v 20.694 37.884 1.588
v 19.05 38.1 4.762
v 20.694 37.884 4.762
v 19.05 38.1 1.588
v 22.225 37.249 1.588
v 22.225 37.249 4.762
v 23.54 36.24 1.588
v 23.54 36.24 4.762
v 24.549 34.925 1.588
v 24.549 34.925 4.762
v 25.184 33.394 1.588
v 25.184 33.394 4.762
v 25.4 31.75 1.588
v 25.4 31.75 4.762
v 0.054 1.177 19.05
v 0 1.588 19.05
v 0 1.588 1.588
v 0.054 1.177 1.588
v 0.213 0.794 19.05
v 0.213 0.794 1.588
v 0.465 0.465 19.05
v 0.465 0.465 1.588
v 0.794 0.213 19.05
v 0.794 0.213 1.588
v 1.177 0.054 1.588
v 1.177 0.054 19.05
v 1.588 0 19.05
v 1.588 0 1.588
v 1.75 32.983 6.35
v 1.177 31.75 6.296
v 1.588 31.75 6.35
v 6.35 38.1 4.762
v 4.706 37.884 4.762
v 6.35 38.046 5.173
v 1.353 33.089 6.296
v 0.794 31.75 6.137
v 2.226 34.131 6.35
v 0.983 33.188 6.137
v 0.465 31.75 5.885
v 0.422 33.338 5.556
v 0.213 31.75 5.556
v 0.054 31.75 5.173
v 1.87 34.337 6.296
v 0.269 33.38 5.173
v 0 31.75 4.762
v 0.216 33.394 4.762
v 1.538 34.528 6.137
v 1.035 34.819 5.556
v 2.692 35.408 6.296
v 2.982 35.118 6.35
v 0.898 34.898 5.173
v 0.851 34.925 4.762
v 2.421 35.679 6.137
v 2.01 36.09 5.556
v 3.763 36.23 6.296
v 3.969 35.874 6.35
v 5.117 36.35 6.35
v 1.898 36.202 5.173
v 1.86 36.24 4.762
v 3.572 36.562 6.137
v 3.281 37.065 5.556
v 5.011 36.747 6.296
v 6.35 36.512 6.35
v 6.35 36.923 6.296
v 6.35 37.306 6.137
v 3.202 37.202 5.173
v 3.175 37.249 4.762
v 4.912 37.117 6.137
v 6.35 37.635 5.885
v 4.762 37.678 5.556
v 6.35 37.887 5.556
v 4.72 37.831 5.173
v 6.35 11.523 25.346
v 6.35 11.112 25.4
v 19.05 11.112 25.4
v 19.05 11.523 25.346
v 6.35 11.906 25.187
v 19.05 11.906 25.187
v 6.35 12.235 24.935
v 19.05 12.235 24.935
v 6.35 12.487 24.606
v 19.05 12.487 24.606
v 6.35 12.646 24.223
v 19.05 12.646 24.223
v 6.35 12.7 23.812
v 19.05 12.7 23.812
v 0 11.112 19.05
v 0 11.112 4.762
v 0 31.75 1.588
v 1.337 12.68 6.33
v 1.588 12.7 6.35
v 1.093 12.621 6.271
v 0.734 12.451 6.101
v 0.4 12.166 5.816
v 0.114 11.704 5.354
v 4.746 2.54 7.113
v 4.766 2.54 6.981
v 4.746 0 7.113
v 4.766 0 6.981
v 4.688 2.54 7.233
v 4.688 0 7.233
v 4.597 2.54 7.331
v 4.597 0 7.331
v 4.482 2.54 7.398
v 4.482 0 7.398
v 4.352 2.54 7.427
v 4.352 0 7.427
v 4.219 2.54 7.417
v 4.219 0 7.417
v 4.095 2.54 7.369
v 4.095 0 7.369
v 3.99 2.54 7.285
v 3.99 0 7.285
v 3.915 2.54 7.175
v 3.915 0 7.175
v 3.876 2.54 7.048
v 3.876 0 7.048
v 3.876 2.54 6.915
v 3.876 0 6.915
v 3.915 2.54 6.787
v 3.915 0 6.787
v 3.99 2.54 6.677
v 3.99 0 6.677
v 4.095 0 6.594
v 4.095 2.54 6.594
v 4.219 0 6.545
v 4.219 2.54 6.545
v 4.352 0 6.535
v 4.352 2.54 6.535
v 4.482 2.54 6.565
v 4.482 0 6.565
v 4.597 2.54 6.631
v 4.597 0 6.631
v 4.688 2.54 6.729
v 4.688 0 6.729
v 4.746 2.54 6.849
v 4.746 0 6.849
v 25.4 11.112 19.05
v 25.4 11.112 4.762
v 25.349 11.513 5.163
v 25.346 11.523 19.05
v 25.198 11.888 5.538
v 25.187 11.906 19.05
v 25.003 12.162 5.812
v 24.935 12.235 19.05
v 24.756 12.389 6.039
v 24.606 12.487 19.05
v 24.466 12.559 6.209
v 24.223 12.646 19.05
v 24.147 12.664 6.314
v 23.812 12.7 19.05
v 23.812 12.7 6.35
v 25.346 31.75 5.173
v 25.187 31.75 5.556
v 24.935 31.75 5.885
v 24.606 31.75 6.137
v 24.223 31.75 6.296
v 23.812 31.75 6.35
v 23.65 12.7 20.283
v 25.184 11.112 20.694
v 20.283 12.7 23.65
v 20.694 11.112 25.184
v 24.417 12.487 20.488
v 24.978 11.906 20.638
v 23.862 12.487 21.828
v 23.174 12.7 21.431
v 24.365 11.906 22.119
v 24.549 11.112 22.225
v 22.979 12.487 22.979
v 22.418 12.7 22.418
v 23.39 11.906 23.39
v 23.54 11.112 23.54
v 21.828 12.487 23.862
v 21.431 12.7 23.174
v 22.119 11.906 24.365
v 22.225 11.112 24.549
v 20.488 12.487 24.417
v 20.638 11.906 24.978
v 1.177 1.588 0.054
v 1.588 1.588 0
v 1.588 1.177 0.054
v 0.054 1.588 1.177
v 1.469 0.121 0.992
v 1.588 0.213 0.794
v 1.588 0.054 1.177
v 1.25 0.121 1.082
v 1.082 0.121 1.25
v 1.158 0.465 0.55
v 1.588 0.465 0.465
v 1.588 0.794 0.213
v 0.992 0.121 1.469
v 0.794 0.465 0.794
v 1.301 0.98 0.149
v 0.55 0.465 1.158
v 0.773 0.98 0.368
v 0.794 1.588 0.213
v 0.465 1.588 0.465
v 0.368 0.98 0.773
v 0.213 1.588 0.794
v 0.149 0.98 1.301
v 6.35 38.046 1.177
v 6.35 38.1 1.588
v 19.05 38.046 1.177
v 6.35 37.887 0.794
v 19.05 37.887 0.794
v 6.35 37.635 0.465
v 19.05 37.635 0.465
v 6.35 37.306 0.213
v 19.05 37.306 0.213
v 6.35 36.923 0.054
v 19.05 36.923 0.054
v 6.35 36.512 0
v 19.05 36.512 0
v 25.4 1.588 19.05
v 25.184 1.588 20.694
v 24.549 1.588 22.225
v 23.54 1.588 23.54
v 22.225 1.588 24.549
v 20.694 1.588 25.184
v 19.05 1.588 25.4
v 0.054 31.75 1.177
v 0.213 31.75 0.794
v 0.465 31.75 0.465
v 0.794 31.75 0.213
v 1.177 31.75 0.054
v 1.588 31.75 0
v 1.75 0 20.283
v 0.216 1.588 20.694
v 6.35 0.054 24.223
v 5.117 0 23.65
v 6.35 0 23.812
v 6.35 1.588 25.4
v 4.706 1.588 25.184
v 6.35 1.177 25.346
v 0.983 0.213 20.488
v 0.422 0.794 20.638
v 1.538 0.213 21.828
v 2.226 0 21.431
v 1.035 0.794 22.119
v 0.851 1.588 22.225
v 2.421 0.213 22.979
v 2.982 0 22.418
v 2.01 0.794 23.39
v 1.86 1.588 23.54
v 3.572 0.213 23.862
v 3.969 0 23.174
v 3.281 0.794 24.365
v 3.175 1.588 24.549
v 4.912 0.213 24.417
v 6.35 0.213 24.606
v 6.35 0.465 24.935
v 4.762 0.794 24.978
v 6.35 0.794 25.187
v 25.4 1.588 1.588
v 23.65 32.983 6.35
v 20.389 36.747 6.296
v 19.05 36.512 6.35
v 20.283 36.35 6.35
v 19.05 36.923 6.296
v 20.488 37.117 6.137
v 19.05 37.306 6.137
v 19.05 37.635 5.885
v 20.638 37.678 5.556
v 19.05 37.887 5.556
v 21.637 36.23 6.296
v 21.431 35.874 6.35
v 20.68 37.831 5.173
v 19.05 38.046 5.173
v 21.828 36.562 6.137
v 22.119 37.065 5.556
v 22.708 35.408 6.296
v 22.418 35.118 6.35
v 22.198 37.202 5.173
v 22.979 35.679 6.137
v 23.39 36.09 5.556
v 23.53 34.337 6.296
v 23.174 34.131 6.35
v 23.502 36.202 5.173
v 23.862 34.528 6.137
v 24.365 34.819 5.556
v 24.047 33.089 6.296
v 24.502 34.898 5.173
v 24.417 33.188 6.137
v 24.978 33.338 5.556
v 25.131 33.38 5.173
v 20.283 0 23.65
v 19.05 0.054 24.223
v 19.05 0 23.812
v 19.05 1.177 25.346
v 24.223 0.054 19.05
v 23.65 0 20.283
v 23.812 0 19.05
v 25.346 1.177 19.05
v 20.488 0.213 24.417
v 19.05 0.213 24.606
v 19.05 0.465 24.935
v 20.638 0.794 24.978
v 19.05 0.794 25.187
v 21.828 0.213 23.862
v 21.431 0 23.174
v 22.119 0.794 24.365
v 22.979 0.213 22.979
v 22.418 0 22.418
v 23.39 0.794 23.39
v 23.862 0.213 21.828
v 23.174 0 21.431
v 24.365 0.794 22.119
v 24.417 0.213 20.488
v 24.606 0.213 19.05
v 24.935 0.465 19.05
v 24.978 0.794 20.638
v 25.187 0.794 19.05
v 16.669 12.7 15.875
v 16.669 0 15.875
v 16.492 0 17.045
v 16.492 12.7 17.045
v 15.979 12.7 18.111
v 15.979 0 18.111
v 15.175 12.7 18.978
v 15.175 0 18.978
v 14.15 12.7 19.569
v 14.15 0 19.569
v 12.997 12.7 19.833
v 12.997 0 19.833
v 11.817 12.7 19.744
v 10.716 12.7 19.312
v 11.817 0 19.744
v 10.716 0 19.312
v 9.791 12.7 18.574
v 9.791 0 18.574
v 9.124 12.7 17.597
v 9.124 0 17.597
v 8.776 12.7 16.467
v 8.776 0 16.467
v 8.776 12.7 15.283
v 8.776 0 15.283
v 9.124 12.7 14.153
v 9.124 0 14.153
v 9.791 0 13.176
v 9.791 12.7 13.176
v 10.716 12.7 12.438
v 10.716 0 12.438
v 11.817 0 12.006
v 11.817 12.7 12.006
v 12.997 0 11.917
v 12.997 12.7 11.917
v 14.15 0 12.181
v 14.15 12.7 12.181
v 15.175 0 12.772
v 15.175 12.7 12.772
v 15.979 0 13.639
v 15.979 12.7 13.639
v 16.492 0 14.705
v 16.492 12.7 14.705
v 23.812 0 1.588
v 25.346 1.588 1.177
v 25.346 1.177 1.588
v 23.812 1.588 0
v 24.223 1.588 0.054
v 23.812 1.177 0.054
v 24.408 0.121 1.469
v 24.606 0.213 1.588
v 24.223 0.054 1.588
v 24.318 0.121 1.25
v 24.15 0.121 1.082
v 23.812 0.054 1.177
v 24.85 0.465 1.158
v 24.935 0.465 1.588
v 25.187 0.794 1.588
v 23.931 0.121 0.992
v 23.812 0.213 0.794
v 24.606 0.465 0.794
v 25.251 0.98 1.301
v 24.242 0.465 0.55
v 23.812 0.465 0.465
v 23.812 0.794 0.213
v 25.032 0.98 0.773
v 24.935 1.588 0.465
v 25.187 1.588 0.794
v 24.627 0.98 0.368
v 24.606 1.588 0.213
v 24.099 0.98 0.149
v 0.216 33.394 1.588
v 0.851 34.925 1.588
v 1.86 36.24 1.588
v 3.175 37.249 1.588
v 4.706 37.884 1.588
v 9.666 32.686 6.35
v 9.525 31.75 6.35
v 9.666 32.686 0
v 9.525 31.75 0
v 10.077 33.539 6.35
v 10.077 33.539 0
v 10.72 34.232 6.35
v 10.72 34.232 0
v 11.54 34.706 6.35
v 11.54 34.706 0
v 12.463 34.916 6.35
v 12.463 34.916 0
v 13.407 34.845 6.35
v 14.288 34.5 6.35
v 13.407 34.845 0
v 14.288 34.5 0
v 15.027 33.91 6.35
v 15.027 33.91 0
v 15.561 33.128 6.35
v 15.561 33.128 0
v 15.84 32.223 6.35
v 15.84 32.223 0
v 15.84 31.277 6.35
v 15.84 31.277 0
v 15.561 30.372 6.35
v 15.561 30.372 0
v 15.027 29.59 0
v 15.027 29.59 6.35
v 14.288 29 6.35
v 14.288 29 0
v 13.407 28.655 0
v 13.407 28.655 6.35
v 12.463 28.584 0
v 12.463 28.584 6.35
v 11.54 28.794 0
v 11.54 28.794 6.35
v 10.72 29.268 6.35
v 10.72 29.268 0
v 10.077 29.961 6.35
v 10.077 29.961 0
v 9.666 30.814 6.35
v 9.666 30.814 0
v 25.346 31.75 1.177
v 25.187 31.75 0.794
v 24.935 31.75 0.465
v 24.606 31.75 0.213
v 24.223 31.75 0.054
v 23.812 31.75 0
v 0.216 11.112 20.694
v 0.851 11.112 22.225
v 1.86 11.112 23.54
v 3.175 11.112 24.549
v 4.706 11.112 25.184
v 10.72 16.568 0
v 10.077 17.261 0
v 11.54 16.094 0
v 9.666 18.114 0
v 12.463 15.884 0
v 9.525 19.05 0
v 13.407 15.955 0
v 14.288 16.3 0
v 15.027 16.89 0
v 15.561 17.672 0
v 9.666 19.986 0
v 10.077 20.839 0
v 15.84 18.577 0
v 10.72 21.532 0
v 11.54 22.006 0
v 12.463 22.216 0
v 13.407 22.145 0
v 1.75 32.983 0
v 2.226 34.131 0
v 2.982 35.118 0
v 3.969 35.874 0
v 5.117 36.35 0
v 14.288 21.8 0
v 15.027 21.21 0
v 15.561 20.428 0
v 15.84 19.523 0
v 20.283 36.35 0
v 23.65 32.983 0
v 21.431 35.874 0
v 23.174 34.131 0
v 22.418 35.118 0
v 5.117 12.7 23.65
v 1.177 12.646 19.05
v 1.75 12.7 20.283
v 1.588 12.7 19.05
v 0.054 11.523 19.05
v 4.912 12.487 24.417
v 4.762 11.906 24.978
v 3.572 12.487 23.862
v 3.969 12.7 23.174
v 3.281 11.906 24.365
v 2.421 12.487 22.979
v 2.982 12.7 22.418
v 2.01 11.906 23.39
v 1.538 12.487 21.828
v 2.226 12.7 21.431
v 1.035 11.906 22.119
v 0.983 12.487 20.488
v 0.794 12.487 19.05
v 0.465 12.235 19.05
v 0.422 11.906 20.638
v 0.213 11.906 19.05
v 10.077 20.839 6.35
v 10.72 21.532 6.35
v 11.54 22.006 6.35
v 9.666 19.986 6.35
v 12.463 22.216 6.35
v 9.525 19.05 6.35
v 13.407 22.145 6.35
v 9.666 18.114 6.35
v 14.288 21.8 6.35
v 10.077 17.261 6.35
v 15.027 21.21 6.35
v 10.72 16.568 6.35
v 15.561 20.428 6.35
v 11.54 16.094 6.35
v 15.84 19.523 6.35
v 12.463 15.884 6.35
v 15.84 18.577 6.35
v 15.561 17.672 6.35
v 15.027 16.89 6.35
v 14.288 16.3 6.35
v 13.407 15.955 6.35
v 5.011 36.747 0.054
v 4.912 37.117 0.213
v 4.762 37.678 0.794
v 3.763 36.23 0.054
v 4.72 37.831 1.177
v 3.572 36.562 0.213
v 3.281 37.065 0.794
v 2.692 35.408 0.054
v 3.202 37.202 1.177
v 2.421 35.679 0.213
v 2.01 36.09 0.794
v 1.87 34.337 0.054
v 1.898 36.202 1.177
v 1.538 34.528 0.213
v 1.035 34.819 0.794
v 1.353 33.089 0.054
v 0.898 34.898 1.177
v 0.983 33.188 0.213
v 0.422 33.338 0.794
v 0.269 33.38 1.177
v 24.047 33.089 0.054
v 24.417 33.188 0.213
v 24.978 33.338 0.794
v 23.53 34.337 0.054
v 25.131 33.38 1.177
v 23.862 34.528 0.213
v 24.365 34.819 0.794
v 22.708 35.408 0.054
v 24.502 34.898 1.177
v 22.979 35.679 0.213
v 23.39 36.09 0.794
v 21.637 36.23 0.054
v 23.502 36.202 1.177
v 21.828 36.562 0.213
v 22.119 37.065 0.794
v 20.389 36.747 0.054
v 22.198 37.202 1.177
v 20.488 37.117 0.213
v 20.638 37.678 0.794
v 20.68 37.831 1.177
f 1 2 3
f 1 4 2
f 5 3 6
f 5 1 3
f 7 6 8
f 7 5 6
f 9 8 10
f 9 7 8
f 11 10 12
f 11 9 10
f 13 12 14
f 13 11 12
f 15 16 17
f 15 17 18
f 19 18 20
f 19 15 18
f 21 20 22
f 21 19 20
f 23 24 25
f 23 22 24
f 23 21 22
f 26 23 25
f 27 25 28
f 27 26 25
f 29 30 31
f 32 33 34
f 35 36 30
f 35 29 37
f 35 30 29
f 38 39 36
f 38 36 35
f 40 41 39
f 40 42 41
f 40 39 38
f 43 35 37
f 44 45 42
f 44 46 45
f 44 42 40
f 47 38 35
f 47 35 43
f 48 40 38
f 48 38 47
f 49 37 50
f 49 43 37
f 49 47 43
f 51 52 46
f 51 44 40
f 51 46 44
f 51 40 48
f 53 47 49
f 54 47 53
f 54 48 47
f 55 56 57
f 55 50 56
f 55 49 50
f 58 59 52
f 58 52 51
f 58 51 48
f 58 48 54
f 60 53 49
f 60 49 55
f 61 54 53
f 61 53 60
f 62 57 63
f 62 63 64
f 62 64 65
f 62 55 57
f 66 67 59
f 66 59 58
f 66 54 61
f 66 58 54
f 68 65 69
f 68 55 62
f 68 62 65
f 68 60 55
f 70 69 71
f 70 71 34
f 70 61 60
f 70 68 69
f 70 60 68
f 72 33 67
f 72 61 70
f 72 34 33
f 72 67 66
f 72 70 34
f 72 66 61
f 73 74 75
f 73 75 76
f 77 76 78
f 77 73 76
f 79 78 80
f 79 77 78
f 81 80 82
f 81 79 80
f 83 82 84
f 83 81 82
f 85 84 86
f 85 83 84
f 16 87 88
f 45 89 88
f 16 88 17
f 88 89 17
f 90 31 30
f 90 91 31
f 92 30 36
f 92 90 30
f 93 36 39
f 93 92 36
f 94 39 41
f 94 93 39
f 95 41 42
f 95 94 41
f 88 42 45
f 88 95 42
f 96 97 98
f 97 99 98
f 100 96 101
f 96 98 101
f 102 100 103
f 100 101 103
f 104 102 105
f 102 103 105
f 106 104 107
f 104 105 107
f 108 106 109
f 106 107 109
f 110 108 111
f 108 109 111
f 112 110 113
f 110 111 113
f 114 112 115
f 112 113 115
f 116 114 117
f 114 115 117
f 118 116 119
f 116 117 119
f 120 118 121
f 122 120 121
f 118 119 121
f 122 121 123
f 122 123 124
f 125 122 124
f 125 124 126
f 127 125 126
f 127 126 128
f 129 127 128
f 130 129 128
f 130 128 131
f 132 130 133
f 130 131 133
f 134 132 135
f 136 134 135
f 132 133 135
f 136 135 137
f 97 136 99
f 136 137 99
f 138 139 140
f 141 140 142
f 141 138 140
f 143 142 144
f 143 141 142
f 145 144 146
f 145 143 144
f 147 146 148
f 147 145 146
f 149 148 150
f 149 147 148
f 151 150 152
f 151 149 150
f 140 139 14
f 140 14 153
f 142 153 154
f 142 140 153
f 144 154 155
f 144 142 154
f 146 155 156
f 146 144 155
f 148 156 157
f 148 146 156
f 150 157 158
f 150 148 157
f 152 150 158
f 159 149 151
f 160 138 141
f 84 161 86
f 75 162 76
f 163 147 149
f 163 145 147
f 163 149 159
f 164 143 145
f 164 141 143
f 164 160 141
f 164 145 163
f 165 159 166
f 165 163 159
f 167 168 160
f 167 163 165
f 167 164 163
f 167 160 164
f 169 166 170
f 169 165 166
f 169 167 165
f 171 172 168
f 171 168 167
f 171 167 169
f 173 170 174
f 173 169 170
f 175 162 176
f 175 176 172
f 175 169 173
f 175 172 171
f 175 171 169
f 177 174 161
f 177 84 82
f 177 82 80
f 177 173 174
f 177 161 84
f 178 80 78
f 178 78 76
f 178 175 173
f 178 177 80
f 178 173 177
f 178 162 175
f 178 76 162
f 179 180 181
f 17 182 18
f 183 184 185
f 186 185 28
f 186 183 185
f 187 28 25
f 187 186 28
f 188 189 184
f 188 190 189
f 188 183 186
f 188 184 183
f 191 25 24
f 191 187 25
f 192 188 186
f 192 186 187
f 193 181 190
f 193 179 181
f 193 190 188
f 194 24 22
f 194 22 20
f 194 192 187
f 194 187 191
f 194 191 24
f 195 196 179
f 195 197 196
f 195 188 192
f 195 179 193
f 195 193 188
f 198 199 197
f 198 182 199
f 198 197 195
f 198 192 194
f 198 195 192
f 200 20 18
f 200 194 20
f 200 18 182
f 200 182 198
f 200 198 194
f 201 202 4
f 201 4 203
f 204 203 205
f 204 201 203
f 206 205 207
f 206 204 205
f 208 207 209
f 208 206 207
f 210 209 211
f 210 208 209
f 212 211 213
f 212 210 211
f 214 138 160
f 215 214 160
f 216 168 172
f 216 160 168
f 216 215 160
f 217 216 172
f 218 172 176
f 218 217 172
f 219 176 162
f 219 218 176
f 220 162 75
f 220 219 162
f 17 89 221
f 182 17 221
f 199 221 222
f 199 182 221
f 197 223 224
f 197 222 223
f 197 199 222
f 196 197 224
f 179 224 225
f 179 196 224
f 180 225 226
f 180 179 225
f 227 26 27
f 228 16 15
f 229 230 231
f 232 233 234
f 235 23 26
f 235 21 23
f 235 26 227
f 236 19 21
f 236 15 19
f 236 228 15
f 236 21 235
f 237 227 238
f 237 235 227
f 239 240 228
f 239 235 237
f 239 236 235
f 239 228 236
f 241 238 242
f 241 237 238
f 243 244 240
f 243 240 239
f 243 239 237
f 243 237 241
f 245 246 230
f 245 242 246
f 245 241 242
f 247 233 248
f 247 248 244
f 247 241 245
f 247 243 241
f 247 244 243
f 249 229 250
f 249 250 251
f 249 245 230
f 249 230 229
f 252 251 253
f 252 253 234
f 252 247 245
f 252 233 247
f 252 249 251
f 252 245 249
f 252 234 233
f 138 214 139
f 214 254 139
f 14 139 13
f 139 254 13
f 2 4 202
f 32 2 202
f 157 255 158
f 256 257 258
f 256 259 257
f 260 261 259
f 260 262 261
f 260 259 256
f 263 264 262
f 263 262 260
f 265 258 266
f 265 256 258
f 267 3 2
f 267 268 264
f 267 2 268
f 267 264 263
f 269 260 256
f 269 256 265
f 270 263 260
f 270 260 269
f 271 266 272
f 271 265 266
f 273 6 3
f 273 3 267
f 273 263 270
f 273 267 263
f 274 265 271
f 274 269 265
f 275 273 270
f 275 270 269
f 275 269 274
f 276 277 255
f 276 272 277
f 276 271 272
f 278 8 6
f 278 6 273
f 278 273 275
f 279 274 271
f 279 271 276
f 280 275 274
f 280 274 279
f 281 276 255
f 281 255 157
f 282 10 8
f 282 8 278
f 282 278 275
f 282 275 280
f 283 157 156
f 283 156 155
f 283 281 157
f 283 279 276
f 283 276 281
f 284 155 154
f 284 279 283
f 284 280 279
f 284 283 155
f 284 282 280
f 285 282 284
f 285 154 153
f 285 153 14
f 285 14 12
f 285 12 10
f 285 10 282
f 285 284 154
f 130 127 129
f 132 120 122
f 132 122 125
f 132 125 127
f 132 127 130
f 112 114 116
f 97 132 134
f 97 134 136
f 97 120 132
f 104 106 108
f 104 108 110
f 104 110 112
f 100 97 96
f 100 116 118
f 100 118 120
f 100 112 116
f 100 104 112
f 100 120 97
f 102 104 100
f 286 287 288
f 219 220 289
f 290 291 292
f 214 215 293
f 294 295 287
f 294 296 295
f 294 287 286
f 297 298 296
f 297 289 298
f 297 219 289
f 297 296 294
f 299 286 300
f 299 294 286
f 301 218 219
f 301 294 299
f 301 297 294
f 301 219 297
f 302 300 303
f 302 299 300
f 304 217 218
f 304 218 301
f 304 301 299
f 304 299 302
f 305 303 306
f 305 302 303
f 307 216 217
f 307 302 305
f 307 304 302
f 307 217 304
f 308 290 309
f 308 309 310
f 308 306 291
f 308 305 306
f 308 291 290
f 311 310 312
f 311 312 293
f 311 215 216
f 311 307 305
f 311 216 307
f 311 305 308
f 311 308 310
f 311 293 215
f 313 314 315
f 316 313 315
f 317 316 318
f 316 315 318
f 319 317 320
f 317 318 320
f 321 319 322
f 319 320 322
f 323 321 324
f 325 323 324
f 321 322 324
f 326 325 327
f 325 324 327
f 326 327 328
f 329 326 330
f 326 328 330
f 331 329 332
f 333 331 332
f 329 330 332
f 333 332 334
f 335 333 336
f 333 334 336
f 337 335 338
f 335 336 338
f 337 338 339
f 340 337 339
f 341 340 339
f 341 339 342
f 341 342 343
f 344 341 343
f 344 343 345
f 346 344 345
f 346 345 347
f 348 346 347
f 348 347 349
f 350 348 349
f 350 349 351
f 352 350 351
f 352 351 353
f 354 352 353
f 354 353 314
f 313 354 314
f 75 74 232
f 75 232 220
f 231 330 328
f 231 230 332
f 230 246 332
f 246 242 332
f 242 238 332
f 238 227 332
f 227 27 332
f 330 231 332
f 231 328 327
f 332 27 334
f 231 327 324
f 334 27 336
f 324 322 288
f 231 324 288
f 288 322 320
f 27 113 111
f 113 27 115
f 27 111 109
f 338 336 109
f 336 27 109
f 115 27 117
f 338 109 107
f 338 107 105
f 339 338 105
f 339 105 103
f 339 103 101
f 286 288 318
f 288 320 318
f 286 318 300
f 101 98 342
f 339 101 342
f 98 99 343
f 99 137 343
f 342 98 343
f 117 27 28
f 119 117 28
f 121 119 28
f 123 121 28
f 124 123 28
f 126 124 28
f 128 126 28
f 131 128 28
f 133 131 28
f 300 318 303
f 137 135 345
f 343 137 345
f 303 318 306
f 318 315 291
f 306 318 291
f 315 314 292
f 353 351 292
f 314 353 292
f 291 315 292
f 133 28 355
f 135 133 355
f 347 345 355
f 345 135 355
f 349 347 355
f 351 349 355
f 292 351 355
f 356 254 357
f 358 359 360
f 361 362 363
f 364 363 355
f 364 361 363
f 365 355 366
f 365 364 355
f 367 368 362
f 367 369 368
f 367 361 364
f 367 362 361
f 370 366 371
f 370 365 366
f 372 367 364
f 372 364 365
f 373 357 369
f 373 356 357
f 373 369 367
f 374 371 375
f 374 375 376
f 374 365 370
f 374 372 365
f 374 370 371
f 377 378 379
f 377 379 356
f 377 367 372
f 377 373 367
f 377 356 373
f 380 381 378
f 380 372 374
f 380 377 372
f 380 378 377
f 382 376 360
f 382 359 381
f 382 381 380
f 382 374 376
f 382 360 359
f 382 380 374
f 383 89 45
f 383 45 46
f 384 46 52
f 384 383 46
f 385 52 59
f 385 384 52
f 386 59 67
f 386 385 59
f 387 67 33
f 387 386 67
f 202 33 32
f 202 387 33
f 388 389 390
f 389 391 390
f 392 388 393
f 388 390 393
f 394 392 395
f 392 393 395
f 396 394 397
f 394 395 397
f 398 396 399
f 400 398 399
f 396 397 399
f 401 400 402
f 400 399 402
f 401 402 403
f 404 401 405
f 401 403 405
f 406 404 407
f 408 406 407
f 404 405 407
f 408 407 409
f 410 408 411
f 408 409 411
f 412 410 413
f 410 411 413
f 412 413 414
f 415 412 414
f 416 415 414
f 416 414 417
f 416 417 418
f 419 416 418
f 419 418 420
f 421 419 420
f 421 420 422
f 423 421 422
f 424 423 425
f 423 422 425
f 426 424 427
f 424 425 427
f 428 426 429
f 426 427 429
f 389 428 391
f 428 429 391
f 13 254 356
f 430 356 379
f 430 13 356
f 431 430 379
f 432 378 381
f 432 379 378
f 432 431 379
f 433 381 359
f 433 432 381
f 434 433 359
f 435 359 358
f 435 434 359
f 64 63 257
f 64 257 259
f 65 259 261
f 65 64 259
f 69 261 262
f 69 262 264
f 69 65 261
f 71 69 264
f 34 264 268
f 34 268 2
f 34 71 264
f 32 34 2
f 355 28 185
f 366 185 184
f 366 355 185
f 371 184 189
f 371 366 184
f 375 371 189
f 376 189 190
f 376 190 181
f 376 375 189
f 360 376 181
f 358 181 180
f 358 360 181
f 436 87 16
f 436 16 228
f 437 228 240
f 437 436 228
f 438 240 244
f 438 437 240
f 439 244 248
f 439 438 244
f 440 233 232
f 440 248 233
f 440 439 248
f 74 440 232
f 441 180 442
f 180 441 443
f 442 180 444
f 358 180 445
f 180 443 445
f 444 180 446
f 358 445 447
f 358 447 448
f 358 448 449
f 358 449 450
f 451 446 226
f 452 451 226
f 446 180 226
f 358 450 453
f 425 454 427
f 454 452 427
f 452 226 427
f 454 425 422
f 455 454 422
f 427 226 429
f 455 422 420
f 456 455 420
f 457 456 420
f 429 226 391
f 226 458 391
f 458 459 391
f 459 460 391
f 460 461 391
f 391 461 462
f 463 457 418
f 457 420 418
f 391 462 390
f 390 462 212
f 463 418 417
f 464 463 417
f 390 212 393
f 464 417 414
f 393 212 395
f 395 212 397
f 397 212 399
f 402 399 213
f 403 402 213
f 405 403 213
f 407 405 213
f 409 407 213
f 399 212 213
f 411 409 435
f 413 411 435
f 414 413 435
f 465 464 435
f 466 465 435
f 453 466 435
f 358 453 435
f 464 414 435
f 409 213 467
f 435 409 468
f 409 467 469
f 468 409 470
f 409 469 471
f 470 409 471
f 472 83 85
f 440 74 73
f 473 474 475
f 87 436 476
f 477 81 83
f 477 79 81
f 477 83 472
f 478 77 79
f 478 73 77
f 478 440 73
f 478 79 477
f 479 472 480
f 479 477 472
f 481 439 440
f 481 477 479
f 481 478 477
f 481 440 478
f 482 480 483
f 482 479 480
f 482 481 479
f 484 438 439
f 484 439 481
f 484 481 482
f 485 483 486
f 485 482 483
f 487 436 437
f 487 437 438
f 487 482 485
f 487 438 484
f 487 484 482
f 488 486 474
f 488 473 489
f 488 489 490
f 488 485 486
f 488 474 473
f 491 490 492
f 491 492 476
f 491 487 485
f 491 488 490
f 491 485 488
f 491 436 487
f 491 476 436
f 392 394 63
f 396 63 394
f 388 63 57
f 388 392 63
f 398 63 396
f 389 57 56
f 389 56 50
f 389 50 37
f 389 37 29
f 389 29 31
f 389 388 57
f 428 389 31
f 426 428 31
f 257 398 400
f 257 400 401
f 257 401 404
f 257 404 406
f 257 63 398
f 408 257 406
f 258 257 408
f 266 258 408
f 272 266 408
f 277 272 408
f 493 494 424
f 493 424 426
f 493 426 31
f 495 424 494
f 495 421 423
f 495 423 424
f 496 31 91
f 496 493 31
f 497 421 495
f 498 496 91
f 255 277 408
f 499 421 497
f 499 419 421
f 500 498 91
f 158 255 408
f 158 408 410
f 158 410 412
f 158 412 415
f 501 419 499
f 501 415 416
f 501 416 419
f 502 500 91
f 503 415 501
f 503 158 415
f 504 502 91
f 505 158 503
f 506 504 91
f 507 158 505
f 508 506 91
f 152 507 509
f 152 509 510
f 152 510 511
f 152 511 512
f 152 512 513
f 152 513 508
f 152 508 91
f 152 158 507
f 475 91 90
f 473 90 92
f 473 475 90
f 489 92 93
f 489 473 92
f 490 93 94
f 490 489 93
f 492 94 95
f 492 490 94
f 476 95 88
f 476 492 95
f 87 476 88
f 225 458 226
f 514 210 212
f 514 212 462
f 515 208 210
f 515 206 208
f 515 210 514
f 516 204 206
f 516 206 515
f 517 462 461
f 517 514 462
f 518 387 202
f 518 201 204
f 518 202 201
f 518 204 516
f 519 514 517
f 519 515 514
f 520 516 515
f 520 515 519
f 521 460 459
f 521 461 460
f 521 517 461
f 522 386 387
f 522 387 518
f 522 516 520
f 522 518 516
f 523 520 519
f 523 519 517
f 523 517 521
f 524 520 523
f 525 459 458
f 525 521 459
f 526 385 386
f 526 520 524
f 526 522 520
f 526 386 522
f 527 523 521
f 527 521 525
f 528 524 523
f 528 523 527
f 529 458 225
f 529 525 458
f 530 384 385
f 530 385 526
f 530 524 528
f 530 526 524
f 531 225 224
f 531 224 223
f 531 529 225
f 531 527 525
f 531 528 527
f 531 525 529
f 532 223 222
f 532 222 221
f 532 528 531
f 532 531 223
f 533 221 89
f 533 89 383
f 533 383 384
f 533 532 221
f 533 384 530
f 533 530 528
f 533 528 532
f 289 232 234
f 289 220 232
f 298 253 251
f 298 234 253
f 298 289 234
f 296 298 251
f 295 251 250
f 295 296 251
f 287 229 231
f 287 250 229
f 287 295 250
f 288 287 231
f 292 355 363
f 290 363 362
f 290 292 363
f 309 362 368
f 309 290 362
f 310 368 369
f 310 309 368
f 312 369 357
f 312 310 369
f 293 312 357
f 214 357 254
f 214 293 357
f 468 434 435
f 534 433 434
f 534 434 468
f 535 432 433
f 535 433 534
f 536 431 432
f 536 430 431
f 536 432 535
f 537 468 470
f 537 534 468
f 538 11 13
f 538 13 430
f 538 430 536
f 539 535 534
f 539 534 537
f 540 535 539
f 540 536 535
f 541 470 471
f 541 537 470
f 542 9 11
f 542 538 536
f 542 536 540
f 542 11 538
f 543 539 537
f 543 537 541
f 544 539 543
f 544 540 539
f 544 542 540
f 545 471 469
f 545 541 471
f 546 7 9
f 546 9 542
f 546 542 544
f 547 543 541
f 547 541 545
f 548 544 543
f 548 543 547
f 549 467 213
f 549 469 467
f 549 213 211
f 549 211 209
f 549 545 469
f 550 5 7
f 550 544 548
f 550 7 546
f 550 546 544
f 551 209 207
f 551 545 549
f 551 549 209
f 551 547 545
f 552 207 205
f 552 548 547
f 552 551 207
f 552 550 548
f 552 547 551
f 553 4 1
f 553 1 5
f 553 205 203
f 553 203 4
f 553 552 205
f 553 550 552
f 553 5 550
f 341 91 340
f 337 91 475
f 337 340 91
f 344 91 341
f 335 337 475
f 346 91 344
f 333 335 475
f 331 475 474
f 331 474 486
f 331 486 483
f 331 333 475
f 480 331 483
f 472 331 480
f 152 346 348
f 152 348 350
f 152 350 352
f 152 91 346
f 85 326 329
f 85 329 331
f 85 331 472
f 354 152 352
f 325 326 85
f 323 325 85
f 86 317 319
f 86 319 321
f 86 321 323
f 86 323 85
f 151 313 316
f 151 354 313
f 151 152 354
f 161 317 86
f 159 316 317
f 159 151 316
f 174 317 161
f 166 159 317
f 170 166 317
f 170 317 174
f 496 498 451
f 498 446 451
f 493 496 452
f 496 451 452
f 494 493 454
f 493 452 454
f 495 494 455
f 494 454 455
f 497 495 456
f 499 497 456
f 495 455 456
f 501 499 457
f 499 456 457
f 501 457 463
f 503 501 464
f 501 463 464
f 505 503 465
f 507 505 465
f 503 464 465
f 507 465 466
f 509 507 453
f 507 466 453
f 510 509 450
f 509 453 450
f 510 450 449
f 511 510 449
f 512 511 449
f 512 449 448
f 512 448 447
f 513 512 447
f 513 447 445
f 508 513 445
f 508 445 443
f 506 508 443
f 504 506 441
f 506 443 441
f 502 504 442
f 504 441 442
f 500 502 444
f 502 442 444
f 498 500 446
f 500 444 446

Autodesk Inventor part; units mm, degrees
ref_plane "YZ Plane" through (0, 0, 0) normal (1, 0, 0) x (0, 1, 0)
ref_plane "XZ Plane" through (0, 0, 0) normal (0, 1, 0) x (-1, 0, 0)
ref_plane "XY Plane" through (0, 0, 0) normal (0, 0, 1) x (1, 0, 0)
sketch "Sketch1" plane through (0, 0, 0) normal (0, 0, 1) x (1, 0, 0)
  line L0 (0, 0) -> (25.4, 0)
  line L1 (25.4, 0) -> (25.4, 38.1)
  line L2 (25.4, 38.1) -> (0, 38.1)
  line L3 (0, 38.1) -> (0, 0)
  dimension "d0" = 38.1
  dimension "d1" = 25.4
extrude "Extrusion1" add sketch "Sketch1" along normal blind 25.4
sketch "Sketch4" plane through (25.4, 0, 0) normal (1, 0, 0) x (0, 0, -1)
  line L0 (0, 0) -> (-25.4, 0) projected
  line L1 (0, 0) -> (0, 38.1) projected
  line L2 (-25.4, 38.1) -> (-6.35, 38.1)
  line L3 (-6.35, 38.1) -> (-6.35, 12.7)
  line L4 (-6.35, 12.7) -> (-25.4, 12.7)
  line L5 (-25.4, 12.7) -> (-25.4, 38.1)
  dimension "d23" = 6.35
  dimension "d24" = 12.7
extrude "Extrusion4" cut sketch "Sketch4" against normal through all
sketch "Sketch3" plane through (0, 0, 0) normal (0, 0, -1) x (-1, 0, 0)
  line L0 (-25.4, 38.1) -> (0, 38.1) projected
  line L1 (-25.4, 0) -> (-25.4, 38.1) projected
  circle A0 centre (-12.7, 31.75) radius 3.175
  circle A1 centre (-12.7, 19.05) radius 3.175
  dimension "d11" = 6.35
  dimension "d12" = 6.35
  dimension "d13" = 12.7
  dimension "d14" = 12.7
  dimension "d22" = 12.7
extrude "Extrusion3" cut sketch "Sketch3" against normal through all
sketch "Sketch5" plane through (0, 0, 0) normal (0, -1, 0) x (1, 0, 0)
  line L0 (25.4, 25.4) -> (0, 25.4) projected
  line L1 (25.4, 0) -> (25.4, 25.4) projected
  circle A0 centre (12.7, 15.875) radius 3.9688
  dimension "d27" = 9.525
  dimension "d28" = 7.9375
  dimension "d29" = 12.7
extrude "Extrusion5" cut sketch "Sketch5" against normal up to next
fillet "Fillet4" radius 1.5875 13 edges at (12.7, 38.1, 6.35) (12.7, 38.1, 0) (0, 25.4, 6.35) (0, 19.05, 0) (25.4, 25.4, 6.35) (25.4, 19.05, 0) (12.7, 0, 0) (25.4, 0, 12.7) (0, 0, 12.7) (25.4, 12.7, 15.875) (0, 12.7, 15.875) (12.7, 12.7, 25.4) (12.7, 0, 25.4)
fillet "Fillet5" radius 6.35 12 edges at (0.465, 12.235, 24.935) (0.465, 0.465, 24.935) (0, 6.35, 25.4) (24.935, 0.465, 24.935) (24.935, 12.235, 24.935) (25.4, 6.35, 25.4) (0.465, 37.635, 5.885) (0.465, 37.635, 0.465) (0, 38.1, 3.175) (24.935, 37.635, 5.885) (24.935, 37.635, 0.465) (25.4, 38.1, 3.175)
sketch "Sketch6" plane through (1.5875, 0, 1.5875) normal (0, -1, 0) x (1, 0, 0)
  circle A0 centre (2.7307, 5.3937) radius 0.4473
  point P0 (-1.5875, -1.5875)
extrude "Extrusion6" cut sketch "Sketch6" against normal blind 2.54
properties part number "MainLiftBlock" material "Aluminum-6061"
